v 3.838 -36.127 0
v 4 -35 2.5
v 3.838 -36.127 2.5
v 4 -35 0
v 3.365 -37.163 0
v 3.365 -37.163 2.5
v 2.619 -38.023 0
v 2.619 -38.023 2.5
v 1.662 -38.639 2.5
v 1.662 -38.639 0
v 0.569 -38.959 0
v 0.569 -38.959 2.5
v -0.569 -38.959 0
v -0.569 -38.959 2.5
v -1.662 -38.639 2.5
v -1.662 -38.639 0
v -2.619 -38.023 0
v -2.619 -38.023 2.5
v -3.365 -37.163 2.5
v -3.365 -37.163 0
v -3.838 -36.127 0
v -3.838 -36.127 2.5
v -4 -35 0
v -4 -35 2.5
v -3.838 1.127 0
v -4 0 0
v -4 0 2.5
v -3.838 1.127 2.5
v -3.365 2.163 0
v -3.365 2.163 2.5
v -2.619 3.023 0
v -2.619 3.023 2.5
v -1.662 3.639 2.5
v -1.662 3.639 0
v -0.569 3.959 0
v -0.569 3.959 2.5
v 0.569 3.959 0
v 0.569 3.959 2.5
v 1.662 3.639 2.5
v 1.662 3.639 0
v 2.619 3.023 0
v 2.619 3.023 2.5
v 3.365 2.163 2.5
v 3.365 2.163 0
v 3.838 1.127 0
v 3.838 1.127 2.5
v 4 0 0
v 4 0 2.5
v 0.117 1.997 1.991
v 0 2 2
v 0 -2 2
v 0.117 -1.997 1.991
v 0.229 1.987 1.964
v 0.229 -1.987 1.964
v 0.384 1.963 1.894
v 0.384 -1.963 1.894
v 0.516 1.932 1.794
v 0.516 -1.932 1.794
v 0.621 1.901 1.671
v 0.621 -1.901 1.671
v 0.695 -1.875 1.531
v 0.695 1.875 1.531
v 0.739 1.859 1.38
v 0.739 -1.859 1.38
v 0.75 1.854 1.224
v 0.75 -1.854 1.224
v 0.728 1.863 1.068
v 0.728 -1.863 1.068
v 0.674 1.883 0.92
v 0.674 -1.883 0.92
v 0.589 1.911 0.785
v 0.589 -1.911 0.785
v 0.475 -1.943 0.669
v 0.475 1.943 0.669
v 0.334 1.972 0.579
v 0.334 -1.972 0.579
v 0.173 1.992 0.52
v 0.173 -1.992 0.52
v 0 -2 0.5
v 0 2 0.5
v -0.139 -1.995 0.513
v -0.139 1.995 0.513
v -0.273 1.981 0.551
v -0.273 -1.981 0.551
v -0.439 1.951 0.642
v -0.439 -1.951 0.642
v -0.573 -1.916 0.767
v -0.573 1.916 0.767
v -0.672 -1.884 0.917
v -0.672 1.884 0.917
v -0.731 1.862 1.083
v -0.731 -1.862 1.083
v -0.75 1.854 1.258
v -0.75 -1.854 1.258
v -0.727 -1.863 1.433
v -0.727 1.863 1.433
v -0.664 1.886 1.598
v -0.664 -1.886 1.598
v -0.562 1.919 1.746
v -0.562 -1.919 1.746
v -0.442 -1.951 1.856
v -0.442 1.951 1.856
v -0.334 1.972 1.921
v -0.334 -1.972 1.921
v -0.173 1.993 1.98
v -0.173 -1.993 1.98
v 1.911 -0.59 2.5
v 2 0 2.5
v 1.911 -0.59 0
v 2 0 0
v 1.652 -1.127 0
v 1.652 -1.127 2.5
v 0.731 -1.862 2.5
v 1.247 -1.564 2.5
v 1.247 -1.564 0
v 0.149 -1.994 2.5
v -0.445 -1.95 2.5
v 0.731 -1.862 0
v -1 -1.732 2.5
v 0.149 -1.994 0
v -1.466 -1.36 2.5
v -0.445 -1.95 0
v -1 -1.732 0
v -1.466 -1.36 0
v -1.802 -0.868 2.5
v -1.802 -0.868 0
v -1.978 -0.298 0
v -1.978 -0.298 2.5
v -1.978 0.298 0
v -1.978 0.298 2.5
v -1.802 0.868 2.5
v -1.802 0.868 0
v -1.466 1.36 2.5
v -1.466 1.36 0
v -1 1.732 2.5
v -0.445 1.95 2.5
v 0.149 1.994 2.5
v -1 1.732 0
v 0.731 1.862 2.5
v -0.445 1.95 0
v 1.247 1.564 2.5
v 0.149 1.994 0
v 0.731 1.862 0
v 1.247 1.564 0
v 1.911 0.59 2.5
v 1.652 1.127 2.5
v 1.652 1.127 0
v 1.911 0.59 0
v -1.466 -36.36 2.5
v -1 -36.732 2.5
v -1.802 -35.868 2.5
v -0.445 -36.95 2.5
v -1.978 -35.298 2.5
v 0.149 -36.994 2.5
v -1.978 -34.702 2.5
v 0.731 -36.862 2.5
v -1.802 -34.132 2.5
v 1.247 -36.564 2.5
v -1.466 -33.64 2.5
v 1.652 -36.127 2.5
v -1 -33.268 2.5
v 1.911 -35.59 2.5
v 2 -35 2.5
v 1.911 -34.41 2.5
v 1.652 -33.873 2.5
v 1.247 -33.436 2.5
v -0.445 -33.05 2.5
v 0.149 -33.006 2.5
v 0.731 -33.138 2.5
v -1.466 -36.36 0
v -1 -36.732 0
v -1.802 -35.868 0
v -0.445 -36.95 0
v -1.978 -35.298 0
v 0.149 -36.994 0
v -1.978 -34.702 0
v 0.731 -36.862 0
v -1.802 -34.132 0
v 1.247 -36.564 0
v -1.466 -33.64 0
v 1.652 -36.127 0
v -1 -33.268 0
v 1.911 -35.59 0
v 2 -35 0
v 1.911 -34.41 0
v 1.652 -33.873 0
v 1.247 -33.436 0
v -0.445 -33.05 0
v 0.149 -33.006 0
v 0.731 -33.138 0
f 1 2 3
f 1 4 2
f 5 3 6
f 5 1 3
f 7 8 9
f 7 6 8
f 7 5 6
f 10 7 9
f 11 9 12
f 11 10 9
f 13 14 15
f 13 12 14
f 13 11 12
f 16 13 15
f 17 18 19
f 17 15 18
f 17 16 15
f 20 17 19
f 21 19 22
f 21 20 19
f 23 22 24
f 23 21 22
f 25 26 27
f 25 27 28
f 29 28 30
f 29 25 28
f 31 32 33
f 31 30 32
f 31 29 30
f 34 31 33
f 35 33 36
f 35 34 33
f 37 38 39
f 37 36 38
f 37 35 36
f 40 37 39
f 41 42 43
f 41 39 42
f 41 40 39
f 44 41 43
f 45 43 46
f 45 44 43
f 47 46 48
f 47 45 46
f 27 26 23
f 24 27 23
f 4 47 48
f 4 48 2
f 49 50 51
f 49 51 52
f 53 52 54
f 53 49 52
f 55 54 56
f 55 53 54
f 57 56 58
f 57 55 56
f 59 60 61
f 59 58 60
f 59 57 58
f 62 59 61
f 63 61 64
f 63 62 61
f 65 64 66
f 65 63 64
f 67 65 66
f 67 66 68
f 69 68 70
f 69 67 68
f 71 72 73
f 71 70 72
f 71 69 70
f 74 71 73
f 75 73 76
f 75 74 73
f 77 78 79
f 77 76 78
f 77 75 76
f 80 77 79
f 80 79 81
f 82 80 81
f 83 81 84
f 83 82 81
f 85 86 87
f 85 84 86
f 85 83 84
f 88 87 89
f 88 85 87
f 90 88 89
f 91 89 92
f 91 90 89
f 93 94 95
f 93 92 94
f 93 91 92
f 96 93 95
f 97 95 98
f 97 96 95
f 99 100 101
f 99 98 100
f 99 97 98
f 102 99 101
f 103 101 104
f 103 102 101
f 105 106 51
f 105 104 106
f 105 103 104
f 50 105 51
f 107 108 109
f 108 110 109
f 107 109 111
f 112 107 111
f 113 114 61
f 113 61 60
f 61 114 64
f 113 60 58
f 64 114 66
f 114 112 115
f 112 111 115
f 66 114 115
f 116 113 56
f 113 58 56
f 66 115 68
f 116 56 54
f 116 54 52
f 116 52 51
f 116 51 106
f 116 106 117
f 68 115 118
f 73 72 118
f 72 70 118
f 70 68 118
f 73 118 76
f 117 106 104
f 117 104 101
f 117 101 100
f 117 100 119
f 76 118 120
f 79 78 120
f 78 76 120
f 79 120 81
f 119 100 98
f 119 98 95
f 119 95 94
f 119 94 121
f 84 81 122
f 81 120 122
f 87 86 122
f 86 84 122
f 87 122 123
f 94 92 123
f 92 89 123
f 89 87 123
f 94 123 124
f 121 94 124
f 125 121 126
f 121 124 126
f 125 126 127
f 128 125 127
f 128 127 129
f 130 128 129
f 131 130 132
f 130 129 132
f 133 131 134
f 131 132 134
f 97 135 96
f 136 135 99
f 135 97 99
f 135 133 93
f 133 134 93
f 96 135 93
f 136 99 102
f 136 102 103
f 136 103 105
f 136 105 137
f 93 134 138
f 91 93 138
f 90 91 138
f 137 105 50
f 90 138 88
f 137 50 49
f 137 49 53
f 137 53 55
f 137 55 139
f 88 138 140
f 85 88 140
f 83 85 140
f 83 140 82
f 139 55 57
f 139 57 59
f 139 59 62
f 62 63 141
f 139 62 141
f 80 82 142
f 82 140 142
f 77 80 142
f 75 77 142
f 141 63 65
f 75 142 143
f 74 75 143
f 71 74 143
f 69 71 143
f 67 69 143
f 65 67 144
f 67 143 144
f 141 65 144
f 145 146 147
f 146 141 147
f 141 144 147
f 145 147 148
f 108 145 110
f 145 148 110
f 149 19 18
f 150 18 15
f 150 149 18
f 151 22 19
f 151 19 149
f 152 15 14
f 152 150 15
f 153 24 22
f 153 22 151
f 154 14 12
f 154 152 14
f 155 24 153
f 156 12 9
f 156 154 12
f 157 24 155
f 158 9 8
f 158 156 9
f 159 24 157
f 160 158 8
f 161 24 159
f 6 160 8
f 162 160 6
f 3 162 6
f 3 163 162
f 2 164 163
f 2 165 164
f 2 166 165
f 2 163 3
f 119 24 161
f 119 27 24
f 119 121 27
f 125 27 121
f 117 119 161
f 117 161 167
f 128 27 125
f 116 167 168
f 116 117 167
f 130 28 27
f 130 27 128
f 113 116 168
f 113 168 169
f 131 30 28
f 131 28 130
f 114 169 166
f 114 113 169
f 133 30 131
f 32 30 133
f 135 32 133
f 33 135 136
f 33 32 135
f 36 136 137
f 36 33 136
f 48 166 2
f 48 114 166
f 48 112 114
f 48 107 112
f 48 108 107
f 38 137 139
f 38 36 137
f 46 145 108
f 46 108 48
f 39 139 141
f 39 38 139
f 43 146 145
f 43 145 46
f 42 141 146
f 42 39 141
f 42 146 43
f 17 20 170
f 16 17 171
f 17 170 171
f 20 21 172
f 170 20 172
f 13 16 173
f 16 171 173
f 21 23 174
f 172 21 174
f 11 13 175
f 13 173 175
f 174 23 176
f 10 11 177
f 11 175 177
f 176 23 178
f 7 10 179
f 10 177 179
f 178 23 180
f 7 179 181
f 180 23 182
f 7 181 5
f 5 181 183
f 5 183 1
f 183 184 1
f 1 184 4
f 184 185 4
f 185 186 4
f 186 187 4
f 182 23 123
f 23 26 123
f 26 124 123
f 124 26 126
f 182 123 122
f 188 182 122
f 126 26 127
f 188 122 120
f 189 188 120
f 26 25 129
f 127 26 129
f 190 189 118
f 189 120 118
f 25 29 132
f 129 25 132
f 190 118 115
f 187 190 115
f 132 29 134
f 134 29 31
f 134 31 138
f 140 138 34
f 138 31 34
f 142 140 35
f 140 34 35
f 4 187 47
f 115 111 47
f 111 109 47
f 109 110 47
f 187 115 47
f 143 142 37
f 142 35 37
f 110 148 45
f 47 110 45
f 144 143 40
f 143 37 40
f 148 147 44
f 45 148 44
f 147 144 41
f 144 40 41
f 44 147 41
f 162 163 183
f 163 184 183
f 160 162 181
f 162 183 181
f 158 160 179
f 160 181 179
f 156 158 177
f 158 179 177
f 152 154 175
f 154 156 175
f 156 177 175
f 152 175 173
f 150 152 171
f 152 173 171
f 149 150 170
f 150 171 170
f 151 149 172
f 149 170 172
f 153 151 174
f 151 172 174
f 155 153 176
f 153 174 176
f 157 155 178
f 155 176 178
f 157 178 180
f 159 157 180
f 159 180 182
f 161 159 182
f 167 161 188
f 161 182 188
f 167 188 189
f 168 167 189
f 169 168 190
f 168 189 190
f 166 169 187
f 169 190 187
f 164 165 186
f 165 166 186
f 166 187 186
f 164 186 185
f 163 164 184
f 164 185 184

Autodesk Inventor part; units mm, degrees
ref_plane "YZ Plane" through (0, 0, 0) normal (1, 0, 0) x (0, 1, 0)
ref_plane "XZ Plane" through (0, 0, 0) normal (0, 1, 0) x (-1, 0, 0)
ref_plane "XY Plane" through (0, 0, 0) normal (0, 0, 1) x (1, 0, 0)
sketch "Sketch1" plane through (0, 0, 0) normal (0, 0, 1) x (1, 0, 0)
  arc A0 (4, 0) -> (-4, 0) centre (0, 0) ccw
  arc A1 (-4, -35) -> (4, -35) centre (0, -35) ccw
  line L0 (0, 0) -> (0, -41.3039) construction
  line L1 (-4, 0) -> (-4, -35)
  line L2 (4, 0) -> (4, -35)
  circle A2 centre (0, 0) radius 2
  circle A3 centre (0, -35) radius 2
  dimension "d0" = 8
  dimension "d1" = 8
  dimension "d2" = 35
  dimension "d3" = 4
  dimension "d4" = 4
extrude "Extrusion1" add sketch "Sketch1" along normal blind 2.5
sketch "Sketch2" plane through (0, 0, 0) normal (1, 0, 0) x (0, 1, 0)
  line L0 (2, 2.5) -> (2, 0) projected
  line L1 (2, 1.25) -> (-2, 1.25)
  line L2 (-2, 2.5) -> (-2, 0) projected
  line L3 (2, 1.25) -> (-2, 1.25)
  line L4 (-2, 1.25) -> (-2, 2)
  line L5 (-2, 2) -> (2, 2)
  line L6 (2, 2) -> (2, 1.25)
  point P0 (0, 0)
  point P1 (2, 2)
  dimension "d7" = 1.5
revolve "Revolution1" add sketch "Sketch2" angle 360 about axis through (0, 2, 1.25) along (0, -1, 0)
properties part number "1-15"
